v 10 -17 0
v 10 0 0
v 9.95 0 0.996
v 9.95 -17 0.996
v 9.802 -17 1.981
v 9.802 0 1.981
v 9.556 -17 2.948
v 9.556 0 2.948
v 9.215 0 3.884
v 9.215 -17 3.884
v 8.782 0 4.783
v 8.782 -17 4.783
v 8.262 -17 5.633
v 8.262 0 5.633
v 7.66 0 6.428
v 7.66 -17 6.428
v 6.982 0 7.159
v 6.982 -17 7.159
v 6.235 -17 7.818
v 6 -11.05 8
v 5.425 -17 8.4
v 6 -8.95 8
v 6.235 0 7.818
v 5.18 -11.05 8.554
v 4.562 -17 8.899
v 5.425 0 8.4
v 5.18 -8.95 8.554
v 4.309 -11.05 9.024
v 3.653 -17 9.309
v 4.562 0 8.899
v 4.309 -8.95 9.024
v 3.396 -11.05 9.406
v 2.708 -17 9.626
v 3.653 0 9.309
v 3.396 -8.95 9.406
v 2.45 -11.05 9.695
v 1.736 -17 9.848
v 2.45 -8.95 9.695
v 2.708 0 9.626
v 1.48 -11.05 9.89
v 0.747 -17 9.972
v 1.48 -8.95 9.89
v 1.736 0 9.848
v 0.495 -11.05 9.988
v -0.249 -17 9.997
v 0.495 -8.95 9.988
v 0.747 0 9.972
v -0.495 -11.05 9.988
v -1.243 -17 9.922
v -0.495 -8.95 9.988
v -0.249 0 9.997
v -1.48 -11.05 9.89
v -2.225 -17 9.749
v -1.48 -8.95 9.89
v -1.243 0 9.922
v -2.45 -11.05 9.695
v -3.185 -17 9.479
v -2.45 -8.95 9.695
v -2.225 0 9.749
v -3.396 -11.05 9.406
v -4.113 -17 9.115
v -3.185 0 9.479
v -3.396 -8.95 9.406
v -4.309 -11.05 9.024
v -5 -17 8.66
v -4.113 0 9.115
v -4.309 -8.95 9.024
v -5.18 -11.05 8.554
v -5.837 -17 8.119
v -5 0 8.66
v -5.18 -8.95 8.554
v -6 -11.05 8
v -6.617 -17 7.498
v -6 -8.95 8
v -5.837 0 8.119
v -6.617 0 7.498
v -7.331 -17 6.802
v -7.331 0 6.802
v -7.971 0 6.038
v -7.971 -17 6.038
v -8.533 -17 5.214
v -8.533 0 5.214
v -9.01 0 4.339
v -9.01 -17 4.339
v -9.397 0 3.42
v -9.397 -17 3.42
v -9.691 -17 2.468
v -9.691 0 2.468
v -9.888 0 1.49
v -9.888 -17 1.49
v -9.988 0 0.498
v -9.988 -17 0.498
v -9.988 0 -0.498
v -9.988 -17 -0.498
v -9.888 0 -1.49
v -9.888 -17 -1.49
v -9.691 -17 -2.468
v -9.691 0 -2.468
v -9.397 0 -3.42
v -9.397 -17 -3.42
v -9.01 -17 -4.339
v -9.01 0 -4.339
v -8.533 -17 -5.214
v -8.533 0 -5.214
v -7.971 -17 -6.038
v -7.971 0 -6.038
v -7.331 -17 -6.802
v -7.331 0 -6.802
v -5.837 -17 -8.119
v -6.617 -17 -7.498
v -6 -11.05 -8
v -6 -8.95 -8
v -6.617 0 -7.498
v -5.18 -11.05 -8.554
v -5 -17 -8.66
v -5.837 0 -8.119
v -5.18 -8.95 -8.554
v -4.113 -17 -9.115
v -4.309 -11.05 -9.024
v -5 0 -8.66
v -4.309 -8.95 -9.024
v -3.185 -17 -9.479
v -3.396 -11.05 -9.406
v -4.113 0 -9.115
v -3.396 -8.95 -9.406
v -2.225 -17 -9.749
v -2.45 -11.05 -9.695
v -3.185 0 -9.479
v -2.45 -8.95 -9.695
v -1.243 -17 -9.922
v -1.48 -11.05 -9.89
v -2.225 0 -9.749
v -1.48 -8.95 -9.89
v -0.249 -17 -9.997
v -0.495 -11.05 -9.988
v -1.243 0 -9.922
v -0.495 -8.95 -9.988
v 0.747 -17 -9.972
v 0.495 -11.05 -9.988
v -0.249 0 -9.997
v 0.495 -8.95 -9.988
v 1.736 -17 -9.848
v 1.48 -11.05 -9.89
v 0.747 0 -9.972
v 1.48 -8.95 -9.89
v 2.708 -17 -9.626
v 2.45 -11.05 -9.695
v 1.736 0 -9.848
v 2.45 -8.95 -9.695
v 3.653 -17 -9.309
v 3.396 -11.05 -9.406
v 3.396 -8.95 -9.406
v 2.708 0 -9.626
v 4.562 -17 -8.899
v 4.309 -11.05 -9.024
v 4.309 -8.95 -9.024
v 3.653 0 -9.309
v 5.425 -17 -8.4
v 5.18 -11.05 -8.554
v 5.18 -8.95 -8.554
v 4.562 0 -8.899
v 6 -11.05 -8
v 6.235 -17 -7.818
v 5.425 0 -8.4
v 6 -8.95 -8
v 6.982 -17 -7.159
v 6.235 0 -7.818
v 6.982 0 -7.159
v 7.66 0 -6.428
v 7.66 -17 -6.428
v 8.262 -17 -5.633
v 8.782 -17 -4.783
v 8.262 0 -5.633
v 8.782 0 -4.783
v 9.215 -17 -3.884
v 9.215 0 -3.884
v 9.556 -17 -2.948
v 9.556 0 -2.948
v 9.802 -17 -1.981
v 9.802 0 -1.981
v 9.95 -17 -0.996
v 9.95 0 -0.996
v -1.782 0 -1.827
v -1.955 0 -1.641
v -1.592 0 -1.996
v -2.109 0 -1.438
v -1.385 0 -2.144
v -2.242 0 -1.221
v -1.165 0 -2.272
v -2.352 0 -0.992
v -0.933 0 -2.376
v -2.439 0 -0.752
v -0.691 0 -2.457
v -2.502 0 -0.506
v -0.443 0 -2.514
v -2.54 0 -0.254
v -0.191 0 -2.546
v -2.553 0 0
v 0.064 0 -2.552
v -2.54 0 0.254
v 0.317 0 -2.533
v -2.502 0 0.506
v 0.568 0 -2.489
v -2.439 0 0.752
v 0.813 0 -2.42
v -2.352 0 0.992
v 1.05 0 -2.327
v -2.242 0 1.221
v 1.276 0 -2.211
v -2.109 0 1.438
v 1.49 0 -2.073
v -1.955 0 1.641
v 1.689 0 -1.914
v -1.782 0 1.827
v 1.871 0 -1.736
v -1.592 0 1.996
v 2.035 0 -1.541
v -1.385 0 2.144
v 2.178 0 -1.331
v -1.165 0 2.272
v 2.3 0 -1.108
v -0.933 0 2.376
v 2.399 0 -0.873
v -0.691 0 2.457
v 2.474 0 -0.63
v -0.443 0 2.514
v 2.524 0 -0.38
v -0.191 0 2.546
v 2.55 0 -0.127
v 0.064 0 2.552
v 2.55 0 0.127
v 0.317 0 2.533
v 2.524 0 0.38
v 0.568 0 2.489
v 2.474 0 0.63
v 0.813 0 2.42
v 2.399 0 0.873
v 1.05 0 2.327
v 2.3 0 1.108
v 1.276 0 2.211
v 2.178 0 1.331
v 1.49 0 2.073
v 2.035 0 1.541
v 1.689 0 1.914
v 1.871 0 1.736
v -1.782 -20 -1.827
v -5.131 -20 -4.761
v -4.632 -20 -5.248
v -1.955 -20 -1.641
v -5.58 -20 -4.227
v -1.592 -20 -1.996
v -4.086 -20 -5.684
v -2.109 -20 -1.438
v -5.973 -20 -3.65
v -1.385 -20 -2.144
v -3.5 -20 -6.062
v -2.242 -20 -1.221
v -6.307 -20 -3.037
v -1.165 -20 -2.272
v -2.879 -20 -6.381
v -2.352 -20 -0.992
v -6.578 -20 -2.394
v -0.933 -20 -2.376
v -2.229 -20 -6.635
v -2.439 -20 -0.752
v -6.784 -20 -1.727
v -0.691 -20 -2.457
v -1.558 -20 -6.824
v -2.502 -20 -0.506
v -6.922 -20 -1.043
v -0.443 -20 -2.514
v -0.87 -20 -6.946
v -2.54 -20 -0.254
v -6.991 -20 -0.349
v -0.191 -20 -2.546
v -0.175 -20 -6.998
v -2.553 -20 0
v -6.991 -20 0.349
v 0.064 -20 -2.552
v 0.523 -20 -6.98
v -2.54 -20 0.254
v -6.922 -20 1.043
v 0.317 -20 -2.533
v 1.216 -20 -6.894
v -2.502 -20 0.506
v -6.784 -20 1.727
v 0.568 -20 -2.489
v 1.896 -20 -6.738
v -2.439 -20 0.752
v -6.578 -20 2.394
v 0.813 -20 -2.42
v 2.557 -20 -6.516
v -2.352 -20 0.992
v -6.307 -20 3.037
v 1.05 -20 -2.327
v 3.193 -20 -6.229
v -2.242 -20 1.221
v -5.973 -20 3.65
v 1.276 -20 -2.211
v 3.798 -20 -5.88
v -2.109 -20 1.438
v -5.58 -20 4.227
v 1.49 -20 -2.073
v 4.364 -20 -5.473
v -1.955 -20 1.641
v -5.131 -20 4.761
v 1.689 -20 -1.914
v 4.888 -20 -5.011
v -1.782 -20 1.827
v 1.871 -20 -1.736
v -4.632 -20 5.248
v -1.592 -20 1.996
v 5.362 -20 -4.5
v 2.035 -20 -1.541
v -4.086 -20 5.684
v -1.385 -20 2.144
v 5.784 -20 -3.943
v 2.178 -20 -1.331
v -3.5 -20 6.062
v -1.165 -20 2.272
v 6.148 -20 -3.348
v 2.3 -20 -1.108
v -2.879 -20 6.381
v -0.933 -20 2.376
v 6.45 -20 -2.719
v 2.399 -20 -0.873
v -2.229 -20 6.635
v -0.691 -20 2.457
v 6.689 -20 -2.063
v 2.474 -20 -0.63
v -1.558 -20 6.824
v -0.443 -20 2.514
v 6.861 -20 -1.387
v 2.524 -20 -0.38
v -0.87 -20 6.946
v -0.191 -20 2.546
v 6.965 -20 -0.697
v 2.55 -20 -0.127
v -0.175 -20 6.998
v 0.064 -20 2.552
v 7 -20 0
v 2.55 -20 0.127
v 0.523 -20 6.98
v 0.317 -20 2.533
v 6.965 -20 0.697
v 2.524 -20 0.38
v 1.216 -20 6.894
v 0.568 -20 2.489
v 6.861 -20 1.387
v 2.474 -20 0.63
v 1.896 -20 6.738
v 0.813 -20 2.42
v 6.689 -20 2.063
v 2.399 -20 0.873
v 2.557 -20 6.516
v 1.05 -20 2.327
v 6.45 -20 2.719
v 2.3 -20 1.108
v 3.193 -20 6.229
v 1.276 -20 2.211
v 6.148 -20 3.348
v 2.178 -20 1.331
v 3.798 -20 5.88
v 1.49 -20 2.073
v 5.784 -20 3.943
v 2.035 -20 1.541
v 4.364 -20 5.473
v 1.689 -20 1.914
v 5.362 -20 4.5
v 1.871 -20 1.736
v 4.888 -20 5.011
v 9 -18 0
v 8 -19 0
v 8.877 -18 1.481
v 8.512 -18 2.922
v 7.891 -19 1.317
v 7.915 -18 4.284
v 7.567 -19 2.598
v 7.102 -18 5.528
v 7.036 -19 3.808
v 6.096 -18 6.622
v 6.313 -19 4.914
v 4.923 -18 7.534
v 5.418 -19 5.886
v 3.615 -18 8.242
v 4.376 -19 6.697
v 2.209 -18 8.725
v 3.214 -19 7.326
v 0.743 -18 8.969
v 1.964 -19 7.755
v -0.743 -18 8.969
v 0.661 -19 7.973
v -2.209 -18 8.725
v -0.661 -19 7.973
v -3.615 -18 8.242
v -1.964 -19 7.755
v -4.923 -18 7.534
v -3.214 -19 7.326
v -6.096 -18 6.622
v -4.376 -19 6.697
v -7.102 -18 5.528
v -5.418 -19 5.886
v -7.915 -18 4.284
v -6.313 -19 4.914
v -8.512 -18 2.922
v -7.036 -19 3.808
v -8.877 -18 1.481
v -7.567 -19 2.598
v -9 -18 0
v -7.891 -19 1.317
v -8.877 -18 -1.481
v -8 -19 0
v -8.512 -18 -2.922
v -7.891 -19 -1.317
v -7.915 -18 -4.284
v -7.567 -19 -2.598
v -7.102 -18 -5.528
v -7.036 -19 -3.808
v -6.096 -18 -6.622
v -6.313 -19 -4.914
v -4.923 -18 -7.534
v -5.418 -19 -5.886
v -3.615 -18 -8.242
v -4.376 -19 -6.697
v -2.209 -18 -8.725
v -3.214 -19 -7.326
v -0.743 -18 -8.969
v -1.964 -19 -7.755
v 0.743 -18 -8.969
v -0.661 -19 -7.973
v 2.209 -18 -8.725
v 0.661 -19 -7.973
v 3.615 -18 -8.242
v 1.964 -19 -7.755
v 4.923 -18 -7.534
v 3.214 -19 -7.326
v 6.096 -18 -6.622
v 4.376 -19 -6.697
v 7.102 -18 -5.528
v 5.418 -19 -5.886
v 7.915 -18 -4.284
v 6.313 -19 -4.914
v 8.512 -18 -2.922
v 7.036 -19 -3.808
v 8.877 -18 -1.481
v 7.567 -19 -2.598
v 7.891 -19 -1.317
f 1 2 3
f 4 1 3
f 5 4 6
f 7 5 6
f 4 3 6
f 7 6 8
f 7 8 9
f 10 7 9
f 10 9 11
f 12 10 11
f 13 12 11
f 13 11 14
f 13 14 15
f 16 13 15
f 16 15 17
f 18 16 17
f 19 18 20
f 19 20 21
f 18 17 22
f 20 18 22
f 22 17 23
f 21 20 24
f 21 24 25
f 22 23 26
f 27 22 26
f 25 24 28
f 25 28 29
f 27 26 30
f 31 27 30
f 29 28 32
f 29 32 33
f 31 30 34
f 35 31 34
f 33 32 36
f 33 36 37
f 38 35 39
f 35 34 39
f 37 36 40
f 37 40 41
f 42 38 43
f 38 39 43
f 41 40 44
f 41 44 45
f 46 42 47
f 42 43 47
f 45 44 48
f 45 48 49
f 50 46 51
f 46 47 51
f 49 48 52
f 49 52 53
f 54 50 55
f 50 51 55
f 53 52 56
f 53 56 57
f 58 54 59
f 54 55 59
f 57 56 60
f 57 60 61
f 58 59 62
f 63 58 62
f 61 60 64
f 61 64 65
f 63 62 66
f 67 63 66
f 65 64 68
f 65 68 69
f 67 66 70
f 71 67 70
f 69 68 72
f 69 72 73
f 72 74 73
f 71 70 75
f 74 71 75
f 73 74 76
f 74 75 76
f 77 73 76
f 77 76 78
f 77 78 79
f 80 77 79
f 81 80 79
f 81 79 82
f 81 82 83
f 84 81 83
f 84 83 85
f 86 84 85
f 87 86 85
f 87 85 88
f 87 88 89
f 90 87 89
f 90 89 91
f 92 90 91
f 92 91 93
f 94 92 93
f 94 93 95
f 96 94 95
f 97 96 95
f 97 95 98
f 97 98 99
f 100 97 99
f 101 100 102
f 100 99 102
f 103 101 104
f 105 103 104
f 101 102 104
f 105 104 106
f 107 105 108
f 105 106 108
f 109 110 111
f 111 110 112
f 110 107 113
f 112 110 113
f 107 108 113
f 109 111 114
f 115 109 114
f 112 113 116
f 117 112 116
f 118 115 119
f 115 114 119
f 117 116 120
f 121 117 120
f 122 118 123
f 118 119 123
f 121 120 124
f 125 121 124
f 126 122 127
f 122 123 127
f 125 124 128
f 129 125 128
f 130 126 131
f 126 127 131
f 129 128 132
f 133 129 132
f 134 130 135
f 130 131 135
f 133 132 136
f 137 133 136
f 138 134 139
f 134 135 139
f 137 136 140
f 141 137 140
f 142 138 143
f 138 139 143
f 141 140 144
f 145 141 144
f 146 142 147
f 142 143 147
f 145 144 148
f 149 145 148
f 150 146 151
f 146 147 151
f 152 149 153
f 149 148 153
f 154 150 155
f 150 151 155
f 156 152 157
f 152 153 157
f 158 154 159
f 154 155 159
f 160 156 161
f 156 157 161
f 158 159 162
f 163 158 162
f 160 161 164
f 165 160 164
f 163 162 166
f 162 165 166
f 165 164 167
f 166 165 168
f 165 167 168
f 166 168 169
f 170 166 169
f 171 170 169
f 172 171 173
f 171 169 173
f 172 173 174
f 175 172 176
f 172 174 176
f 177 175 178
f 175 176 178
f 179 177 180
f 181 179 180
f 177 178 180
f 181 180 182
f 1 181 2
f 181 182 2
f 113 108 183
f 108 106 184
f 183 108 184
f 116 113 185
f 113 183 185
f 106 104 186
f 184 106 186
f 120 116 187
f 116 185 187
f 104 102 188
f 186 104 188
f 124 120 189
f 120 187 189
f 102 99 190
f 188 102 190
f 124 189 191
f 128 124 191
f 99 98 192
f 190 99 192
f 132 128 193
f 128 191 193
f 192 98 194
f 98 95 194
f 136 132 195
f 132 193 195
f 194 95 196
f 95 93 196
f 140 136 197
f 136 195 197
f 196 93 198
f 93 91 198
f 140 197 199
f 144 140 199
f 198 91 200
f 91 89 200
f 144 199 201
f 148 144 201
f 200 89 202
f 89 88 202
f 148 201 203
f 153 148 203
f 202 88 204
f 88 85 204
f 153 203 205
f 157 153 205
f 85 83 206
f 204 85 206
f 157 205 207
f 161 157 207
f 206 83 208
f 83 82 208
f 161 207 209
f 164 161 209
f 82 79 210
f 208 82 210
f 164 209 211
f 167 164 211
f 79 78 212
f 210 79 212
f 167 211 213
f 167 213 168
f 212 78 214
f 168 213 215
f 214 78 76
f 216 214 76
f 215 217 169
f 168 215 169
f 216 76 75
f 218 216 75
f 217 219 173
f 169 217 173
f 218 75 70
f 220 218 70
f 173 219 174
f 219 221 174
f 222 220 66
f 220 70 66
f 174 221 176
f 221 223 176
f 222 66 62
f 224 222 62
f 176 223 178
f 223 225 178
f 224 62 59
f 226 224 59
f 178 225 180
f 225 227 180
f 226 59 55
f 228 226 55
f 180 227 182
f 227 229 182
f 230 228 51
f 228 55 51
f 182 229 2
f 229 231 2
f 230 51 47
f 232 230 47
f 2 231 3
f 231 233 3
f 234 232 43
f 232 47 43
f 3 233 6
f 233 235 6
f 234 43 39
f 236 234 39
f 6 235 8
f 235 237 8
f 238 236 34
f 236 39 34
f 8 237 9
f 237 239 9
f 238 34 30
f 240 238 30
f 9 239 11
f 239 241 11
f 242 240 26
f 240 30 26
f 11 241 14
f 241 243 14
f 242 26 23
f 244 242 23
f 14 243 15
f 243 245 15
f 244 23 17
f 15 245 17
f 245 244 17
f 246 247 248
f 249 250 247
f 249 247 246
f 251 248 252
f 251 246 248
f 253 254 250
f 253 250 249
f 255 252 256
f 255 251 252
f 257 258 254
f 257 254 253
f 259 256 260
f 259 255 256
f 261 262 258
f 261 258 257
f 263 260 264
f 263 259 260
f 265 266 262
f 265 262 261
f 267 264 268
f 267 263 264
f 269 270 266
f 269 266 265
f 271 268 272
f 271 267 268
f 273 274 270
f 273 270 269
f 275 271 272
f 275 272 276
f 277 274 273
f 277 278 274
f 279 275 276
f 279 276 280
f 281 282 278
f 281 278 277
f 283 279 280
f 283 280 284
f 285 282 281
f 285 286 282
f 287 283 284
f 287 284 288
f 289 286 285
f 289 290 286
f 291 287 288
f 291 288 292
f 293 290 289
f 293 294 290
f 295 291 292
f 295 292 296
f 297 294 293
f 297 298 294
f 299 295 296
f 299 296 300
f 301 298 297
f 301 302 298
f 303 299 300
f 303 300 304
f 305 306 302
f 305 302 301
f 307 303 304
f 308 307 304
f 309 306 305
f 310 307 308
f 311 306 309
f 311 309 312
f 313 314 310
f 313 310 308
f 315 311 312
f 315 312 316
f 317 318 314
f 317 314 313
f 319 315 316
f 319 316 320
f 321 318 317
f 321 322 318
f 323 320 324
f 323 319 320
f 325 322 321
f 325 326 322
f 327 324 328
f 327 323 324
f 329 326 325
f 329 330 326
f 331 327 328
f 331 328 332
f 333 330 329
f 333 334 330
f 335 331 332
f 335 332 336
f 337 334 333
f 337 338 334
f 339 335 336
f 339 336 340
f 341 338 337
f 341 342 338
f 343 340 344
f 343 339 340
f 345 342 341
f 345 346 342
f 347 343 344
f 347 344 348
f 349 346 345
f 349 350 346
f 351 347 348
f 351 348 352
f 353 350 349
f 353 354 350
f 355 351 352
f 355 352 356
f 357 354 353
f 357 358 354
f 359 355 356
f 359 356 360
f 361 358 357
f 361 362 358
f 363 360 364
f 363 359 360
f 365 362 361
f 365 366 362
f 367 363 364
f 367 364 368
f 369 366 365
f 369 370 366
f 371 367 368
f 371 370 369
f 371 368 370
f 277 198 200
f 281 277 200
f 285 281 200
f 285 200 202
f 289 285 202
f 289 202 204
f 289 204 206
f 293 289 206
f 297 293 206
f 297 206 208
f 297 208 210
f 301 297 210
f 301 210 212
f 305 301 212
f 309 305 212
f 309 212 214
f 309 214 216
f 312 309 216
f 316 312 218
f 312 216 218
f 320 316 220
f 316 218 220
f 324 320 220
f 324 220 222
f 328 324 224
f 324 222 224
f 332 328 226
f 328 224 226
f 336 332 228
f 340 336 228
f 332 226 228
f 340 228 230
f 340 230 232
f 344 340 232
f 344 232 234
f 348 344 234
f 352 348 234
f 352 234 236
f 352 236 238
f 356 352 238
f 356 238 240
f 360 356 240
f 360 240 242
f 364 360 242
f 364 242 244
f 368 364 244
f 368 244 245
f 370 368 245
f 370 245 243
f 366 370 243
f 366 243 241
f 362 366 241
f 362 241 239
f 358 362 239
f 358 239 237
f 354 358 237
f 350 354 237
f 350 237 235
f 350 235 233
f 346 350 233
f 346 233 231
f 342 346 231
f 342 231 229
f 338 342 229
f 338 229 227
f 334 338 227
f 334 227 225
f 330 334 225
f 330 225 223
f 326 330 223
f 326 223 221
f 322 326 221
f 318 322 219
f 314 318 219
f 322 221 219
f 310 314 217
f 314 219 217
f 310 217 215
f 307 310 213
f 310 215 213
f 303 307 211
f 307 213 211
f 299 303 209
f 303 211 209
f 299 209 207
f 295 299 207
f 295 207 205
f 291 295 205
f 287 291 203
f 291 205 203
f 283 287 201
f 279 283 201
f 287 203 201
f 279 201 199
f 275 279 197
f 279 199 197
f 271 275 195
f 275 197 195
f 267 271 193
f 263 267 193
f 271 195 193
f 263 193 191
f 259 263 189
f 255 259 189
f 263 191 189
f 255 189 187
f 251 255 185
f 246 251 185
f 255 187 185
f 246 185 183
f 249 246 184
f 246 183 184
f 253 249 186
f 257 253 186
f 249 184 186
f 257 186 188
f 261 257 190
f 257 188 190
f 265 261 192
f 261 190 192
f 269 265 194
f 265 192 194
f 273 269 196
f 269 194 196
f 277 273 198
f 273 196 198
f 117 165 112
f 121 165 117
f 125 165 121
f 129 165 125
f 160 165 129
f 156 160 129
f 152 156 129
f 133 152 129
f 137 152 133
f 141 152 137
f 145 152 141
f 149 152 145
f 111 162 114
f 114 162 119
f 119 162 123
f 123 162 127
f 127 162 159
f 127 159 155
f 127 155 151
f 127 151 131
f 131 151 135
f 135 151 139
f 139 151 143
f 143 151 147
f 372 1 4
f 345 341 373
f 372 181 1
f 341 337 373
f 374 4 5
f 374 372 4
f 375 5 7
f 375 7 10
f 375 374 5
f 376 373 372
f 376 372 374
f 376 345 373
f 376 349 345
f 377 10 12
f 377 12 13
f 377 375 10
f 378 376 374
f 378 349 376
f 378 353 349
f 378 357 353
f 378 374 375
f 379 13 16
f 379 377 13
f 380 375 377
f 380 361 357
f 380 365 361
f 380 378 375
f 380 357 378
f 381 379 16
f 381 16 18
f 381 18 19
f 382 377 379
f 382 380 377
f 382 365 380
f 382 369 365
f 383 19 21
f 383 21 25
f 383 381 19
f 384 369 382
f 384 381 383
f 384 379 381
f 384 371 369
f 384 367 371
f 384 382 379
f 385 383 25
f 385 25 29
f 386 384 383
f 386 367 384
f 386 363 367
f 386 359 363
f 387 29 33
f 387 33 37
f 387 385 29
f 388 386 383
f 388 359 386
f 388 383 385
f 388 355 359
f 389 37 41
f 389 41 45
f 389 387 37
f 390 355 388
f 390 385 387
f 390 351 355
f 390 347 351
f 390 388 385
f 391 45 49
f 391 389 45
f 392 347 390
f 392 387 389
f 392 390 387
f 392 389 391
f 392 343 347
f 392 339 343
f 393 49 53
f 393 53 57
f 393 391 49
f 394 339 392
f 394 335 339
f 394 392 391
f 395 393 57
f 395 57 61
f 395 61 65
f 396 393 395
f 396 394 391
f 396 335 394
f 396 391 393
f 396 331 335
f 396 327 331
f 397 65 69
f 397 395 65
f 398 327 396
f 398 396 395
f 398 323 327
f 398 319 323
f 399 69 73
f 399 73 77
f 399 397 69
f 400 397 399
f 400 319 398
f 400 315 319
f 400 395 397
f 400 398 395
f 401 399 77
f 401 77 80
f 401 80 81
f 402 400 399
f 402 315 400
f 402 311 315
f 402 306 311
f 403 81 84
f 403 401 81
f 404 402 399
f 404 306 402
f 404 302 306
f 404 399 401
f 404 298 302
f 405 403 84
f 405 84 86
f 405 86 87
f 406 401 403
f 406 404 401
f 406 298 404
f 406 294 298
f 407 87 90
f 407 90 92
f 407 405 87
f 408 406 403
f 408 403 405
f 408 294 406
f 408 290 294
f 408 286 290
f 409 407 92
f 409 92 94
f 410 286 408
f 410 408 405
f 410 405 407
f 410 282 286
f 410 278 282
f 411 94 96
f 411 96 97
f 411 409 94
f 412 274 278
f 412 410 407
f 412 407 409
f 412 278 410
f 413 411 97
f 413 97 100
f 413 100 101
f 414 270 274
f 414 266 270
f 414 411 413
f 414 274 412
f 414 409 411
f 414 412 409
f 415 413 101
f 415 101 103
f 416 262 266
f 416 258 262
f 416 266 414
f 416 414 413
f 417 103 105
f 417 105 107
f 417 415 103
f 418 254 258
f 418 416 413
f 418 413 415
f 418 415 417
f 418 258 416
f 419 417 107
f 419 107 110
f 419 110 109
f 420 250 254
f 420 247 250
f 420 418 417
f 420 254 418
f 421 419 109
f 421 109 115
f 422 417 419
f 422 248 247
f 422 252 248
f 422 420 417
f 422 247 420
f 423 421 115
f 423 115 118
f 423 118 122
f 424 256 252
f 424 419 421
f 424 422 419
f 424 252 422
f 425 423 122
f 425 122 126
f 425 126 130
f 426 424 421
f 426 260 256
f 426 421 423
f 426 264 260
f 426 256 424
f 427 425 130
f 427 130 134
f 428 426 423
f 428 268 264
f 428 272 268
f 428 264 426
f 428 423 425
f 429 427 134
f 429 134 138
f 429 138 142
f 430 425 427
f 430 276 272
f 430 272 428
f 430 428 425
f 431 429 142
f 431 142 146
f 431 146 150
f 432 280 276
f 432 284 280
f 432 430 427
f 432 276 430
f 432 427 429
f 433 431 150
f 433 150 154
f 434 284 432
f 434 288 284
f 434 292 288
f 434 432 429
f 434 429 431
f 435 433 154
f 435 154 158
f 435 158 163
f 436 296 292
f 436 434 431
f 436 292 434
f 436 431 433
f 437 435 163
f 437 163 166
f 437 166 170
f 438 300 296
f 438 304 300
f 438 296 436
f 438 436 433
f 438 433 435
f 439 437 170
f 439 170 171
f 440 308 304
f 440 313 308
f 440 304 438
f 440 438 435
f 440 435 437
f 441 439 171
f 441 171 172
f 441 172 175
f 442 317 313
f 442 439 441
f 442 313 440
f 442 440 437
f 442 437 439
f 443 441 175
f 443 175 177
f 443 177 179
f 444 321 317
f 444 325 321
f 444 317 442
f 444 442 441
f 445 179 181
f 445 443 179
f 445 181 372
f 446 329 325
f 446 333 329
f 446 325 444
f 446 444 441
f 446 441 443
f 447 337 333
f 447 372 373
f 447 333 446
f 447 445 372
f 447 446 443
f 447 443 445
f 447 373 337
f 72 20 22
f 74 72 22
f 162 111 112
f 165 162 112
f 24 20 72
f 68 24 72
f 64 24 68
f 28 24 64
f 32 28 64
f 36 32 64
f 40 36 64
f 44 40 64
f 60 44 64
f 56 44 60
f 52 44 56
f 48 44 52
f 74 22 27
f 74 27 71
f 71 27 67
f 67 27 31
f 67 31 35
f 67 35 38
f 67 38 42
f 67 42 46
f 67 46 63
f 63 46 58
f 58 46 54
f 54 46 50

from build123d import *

# Parameters (mm, degrees)
F0_R     = 10
F1_DEPTH = 20
F3_D     = 5.1054
F4_W     = 2.1
F4_H     = 19.5127989389
F5_DEPTH = 12.5
F6_SIZE  = 3


with BuildPart() as f1:
    # F0 (on Front) → F1 (new body)
    with BuildSketch(Plane.XZ):
        Circle(F0_R)
    extrude(amount=F1_DEPTH)

    # F3 (through all)
    with Locations(Plane.XZ.offset(20)):
        with Locations((0, 0)):
            Hole(F3_D / 2)

    # F4 (on Right) → F5 (cut, symmetric)
    with BuildSketch(Plane.YZ):
        with Locations((-10, 17.7563994695)):
            Rectangle(F4_W, F4_H)
        with Locations((-10, -17.7563994695)):
            Rectangle(F4_W, F4_H)
    extrude(amount=F5_DEPTH, both=True, mode=Mode.SUBTRACT)

    # F6
    f6_edges = [f1.edges().sort_by_distance(p)[0] for p in [
        (-10, -20, 0),
    ]]
    chamfer(f6_edges, length=F6_SIZE)


solid = f1.part
